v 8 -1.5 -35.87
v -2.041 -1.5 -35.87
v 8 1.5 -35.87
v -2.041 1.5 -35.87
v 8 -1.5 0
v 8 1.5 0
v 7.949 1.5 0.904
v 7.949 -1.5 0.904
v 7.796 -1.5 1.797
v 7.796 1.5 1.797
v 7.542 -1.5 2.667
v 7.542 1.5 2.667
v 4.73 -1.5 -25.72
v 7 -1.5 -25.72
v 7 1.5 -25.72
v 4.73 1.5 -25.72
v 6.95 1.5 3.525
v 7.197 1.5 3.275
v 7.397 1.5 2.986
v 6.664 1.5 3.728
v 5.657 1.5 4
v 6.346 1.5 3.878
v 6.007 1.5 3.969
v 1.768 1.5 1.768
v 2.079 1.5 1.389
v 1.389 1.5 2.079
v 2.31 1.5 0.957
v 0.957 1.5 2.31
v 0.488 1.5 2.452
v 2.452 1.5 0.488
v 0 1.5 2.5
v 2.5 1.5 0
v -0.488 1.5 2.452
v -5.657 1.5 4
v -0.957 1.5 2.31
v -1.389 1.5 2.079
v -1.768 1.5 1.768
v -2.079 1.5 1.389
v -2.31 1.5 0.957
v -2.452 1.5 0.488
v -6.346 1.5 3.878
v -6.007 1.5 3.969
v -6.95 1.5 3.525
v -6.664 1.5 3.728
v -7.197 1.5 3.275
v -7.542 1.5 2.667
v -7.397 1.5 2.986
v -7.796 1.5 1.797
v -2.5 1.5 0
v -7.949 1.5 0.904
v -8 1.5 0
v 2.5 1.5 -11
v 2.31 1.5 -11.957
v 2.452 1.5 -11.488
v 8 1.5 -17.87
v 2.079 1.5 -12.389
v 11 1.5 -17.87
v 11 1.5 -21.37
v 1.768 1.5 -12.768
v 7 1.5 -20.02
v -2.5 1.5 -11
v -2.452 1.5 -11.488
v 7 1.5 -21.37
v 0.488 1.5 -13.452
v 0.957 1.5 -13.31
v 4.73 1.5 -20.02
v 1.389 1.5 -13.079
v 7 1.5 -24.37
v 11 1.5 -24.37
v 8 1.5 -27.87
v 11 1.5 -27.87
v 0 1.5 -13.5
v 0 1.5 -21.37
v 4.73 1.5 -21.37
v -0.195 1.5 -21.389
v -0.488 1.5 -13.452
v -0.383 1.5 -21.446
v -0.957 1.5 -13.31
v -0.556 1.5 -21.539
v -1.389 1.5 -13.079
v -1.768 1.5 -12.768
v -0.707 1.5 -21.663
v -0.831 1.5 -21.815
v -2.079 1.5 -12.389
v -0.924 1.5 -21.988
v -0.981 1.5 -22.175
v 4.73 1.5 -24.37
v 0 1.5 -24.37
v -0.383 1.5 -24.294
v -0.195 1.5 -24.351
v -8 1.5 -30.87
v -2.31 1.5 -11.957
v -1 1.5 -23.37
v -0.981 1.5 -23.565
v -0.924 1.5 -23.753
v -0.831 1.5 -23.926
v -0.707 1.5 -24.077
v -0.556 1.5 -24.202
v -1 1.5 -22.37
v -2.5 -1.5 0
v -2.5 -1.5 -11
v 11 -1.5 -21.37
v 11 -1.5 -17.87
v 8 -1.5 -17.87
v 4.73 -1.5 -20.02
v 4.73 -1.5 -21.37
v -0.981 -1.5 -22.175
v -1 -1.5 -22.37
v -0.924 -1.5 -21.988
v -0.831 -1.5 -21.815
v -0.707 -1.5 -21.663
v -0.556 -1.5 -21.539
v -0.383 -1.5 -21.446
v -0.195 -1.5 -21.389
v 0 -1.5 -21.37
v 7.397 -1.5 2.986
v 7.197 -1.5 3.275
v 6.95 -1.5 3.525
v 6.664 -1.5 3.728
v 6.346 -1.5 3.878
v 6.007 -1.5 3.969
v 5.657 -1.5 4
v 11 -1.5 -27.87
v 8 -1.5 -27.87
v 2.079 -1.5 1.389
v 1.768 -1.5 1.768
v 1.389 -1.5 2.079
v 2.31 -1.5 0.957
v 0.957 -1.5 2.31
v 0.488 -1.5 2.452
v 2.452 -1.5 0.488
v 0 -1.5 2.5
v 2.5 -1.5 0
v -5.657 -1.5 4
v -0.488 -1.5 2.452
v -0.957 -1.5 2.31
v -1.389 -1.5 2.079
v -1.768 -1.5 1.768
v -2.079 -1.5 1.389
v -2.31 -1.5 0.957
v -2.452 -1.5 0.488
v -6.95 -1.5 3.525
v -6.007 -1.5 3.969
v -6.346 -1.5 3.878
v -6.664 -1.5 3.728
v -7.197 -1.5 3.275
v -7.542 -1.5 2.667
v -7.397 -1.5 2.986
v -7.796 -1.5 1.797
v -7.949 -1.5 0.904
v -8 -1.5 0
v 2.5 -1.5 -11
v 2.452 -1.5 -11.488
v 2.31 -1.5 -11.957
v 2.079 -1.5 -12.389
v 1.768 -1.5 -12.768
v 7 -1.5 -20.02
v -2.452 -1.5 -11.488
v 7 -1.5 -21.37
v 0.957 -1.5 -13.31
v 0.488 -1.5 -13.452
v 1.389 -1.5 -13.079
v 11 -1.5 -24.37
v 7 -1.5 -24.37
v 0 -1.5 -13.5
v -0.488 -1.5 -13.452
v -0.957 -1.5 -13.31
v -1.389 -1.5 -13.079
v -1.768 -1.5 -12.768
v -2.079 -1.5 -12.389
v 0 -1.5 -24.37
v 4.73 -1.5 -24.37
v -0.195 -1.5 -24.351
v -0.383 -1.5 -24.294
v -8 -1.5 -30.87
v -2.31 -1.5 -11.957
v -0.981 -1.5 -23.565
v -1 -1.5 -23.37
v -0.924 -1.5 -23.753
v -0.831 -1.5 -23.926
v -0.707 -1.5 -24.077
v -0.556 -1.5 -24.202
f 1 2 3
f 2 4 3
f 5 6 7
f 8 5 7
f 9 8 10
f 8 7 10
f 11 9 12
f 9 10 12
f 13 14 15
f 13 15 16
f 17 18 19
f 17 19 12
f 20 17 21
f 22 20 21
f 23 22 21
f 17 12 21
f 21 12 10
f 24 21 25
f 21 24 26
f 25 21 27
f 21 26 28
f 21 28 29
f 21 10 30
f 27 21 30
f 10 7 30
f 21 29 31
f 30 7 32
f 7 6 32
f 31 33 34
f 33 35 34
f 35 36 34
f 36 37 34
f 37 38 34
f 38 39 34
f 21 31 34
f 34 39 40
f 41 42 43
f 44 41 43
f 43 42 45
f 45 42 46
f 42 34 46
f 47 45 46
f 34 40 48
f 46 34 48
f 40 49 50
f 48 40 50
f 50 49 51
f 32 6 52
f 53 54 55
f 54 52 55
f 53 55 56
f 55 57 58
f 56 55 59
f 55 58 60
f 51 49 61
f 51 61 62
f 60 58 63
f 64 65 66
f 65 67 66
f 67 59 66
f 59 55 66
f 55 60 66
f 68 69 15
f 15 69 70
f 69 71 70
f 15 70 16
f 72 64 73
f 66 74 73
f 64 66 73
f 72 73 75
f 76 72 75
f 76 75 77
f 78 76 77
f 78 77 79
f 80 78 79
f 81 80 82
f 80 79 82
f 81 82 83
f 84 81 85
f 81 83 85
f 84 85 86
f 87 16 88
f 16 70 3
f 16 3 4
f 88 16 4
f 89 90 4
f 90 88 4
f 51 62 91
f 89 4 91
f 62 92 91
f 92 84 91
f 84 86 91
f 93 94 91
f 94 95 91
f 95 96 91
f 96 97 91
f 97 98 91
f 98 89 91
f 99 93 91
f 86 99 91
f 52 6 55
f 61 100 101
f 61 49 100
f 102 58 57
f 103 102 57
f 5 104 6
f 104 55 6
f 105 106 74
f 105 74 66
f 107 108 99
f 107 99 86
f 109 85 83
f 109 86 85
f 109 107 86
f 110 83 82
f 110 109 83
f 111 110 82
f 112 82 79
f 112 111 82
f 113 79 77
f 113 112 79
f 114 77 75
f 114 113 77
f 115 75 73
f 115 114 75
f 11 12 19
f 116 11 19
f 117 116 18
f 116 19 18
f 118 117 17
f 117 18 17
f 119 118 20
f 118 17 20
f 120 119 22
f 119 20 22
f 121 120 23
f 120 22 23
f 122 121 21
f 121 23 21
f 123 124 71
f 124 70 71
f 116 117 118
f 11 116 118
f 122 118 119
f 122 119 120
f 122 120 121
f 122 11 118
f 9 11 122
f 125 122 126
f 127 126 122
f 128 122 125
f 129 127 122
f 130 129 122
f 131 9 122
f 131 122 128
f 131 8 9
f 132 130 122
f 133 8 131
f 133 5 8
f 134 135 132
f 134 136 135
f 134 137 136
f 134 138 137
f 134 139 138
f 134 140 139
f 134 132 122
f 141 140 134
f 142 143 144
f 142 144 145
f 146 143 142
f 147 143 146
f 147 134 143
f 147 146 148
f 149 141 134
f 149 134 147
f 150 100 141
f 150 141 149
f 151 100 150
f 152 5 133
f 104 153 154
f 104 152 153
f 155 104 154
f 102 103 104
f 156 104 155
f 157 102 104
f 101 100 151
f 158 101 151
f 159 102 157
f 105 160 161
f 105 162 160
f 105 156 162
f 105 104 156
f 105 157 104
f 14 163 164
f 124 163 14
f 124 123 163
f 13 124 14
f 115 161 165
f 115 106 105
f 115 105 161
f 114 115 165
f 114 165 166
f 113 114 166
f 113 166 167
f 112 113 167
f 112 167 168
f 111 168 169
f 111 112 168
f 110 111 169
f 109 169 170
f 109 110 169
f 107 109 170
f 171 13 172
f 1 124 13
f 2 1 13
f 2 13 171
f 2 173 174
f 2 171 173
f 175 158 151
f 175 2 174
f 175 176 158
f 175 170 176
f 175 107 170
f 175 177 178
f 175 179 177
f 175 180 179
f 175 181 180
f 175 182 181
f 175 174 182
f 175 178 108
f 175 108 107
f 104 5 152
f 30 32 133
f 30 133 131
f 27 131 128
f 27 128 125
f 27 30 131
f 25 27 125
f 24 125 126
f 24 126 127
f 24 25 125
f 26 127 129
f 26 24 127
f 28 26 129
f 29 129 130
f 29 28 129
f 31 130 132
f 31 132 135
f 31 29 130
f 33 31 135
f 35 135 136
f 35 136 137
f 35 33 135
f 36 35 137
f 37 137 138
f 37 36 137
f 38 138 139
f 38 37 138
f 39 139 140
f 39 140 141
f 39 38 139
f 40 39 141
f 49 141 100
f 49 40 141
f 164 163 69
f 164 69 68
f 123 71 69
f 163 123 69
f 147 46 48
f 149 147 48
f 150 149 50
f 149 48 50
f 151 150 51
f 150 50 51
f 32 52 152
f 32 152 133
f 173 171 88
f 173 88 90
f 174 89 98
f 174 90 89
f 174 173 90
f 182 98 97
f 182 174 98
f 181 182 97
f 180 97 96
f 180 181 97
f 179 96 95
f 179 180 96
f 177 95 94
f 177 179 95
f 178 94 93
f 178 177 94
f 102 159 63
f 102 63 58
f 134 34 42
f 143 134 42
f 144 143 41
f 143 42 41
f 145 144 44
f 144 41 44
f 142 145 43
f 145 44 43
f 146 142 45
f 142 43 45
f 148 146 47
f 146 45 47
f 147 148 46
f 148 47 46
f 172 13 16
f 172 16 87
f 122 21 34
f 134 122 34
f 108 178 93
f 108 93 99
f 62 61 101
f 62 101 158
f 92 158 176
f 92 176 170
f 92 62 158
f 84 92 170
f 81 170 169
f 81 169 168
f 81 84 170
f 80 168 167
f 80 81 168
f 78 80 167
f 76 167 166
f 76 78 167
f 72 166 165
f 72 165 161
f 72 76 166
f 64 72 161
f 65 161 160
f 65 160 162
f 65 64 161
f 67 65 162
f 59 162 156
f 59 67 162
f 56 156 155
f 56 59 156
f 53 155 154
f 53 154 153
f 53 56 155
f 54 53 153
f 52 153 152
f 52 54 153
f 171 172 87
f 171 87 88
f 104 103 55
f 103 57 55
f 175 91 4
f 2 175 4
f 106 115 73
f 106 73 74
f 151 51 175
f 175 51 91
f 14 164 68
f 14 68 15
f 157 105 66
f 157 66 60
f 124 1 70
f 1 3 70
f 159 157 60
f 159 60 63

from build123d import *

# Parameters (mm, degrees)
BOSS_EXTRUDE1_DEPTH     = 1.5
CUT_EXTRUDE1_DEPTH      = 38.54894195
CUT_EXTRUDE1_DEPTH_BACK = 38.54894195


with BuildPart() as part:
    # Sketch2 → Boss-Extrude1 (new, symmetric)
    with BuildSketch(Plane(origin=(0, 0, 0), x_dir=(1, 0, 0), z_dir=(0, 1, 0))):
        with BuildLine():
            Line((-8, 10.748624987), (-8, 30.870225))
            Line((-8, 30.870225), (-2.041232037, 35.870225))
            Line((-2.041232037, 35.870225), (8, 35.870225))
            Line((8, 35.870225), (8, 30.870225))
            Line((8, 30.870225), (8, 27.870225))
            Line((8, 27.870225), (11, 27.870225))
            Line((11, 27.870225), (11, 17.870225))
            Line((11, 17.870225), (8, 17.870225))
            Line((8, 17.870225), (8, 14.870225))
            Line((8, 14.870225), (8, 10.748624987))
            Line((8, 10.748624987), (8, 0))
            ThreePointArc((8, 0), (7.884788477, -1.35281583), (7.542472333, -2.666666667))
            ThreePointArc((7.542472333, -2.666666667), (6.811554788, -3.632993162), (5.656854249, -4))
            Line((5.656854249, -4), (-5.656854249, -4))
            ThreePointArc((-5.656854249, -4), (-6.811554788, -3.632993162), (-7.542472333, -2.666666667))
            ThreePointArc((-7.542472333, -2.666666667), (-7.884788477, -1.35281583), (-8, 0))
            Line((-8, 0), (-8, 10.748624987))
        make_face()
        with BuildLine():
            Line((-2.5, 0), (-2.5, 11))
            ThreePointArc((-2.5, 11), (0, 13.5), (2.5, 11))
            Line((2.5, 11), (2.5, 0))
            ThreePointArc((2.5, 0), (0, -2.5), (-2.5, 0))
        make_face(mode=Mode.SUBTRACT)
    extrude(amount=BOSS_EXTRUDE1_DEPTH, both=True)

    # Sketch4 → Cut-Extrude1 (cut, two sides: drawn at the far end of the back side and taken through both)
    with BuildSketch(Plane(origin=(0, 0, 0), x_dir=(1, 0, 0), z_dir=(0, 1, 0)).offset(-CUT_EXTRUDE1_DEPTH_BACK)):
        with BuildLine():
            Line((11, 24.370225), (7, 24.370225))
            Line((7, 24.370225), (7, 25.720225))
            Line((7, 25.720225), (4.73, 25.720225))
            Line((4.73, 25.720225), (4.73, 24.370225))
            Line((4.73, 24.370225), (0, 24.370225))
            ThreePointArc((0, 24.370225), (-0.707106781, 24.077331781), (-1, 23.370225))
            Line((-1, 23.370225), (-1, 22.370225))
            ThreePointArc((-1, 22.370225), (-0.707106781, 21.663118219), (0, 21.370225))
            Line((0, 21.370225), (4.73, 21.370225))
            Line((4.73, 21.370225), (4.73, 20.020225))
            Line((4.73, 20.020225), (7, 20.020225))
            Line((7, 20.020225), (7, 21.370225))
            Line((7, 21.370225), (11, 21.370225))
            Line((11, 21.370225), (11, 24.370225))
        make_face()
    extrude(amount=CUT_EXTRUDE1_DEPTH + CUT_EXTRUDE1_DEPTH_BACK, mode=Mode.SUBTRACT)


solid = part.part
